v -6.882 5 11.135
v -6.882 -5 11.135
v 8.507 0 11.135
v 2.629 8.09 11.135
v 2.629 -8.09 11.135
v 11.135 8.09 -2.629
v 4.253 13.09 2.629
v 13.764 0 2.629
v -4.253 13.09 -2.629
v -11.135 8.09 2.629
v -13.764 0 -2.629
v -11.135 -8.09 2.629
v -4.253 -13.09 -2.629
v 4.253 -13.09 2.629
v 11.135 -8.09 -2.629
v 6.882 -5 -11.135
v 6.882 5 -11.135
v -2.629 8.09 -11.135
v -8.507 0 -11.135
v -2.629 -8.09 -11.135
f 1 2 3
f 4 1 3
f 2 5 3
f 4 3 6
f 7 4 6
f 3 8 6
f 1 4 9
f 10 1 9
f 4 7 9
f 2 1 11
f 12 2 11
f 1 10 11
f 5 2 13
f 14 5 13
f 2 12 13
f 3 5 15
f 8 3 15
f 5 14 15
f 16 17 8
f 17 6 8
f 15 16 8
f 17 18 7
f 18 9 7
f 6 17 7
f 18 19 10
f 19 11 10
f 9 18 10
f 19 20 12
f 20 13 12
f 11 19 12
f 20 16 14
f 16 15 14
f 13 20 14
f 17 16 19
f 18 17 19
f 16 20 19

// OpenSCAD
module dodecahedron(edge=10)
{
// Kantenlänge a
a = edge; //700;

// Umkreisradius ra
ra = (a/10)*sqrt(10*(5+sqrt(5)));

// Umkugelradius r
r = (a/4) * sqrt(6*(3+sqrt(5)));

// Winkel b1/2 aus Figure 3
beta1 = asin(ra/r);
beta2 = beta1 + 2 * asin(a/(2*r));

function foo(n, b) = [
	r * cos(n * 72) * sin(b),
	r * sin(n * 72) * sin(b),
	r * cos(b)
];

function bar(n, b) = [
	r * cos((n * 72)+36) * sin(b),
	r * sin((n * 72)+36) * sin(b),
	-r * cos(b)
];

points = [
	foo(0,beta1), foo(1,beta1), foo(2,beta1), foo(3,beta1), foo(4,beta1), 
	foo(0,beta2), foo(1,beta2), foo(2,beta2), foo(3,beta2), foo(4,beta2), 
	bar(0,beta1), bar(1,beta1), bar(2,beta1), bar(3,beta1), bar(4,beta1), 
	bar(0,beta2), bar(1,beta2), bar(2,beta2), bar(3,beta2), bar(4,beta2), 
];

paths=[
	// Deckel
	[0,3,2], [0,2,1], [0,4,3],
	// Oben 1
	[15,0,1], [15,1,6], [15,5,0],
	// Oben 2
	[16,1,2], [16,2,7], [16,6,1],
	// Oben 3
	[17,2,3], [17,3,8], [17,7,2],
	// Oben 4
	[18,3,4], [18,4,9], [18,8,3],
	// Oben 5
	[19,4,0], [19,0,5], [19,9,4],
	// Unten 1
	[5,10,14], [5,15,10], [5,14,19],
	// Unten 2
	[6,11,10], [6,16,11], [6,10,15],
	// Unten 3
	[7,12,11], [7,17,12], [7,11,16],
	// Unten 4
	[8,13,12], [8,18,13], [8,12,17],
	// Unten 5
	[9,14,13], [9,19,14], [9,13,18],
	// Boden
	[12,14,10], [12,10,11], [12,13,14]
];

polyhedron(points, paths);


// Debug: Zeichne alle Eckpunkte als kleine Würfel
//for(i=points) translate(i) cube([1,1,1], center = true);

// Debug: Zeichne Punkt Nr "x" als roten Würfel (Ändere x um anderen Punkt hervorzuheben...)
//for(i=[0:19]) if (i==9 /* hier das "x" ändern (0-19) */) #translate(points[i]) cube([1,1,1], center = true);
}

dodecahedron();
